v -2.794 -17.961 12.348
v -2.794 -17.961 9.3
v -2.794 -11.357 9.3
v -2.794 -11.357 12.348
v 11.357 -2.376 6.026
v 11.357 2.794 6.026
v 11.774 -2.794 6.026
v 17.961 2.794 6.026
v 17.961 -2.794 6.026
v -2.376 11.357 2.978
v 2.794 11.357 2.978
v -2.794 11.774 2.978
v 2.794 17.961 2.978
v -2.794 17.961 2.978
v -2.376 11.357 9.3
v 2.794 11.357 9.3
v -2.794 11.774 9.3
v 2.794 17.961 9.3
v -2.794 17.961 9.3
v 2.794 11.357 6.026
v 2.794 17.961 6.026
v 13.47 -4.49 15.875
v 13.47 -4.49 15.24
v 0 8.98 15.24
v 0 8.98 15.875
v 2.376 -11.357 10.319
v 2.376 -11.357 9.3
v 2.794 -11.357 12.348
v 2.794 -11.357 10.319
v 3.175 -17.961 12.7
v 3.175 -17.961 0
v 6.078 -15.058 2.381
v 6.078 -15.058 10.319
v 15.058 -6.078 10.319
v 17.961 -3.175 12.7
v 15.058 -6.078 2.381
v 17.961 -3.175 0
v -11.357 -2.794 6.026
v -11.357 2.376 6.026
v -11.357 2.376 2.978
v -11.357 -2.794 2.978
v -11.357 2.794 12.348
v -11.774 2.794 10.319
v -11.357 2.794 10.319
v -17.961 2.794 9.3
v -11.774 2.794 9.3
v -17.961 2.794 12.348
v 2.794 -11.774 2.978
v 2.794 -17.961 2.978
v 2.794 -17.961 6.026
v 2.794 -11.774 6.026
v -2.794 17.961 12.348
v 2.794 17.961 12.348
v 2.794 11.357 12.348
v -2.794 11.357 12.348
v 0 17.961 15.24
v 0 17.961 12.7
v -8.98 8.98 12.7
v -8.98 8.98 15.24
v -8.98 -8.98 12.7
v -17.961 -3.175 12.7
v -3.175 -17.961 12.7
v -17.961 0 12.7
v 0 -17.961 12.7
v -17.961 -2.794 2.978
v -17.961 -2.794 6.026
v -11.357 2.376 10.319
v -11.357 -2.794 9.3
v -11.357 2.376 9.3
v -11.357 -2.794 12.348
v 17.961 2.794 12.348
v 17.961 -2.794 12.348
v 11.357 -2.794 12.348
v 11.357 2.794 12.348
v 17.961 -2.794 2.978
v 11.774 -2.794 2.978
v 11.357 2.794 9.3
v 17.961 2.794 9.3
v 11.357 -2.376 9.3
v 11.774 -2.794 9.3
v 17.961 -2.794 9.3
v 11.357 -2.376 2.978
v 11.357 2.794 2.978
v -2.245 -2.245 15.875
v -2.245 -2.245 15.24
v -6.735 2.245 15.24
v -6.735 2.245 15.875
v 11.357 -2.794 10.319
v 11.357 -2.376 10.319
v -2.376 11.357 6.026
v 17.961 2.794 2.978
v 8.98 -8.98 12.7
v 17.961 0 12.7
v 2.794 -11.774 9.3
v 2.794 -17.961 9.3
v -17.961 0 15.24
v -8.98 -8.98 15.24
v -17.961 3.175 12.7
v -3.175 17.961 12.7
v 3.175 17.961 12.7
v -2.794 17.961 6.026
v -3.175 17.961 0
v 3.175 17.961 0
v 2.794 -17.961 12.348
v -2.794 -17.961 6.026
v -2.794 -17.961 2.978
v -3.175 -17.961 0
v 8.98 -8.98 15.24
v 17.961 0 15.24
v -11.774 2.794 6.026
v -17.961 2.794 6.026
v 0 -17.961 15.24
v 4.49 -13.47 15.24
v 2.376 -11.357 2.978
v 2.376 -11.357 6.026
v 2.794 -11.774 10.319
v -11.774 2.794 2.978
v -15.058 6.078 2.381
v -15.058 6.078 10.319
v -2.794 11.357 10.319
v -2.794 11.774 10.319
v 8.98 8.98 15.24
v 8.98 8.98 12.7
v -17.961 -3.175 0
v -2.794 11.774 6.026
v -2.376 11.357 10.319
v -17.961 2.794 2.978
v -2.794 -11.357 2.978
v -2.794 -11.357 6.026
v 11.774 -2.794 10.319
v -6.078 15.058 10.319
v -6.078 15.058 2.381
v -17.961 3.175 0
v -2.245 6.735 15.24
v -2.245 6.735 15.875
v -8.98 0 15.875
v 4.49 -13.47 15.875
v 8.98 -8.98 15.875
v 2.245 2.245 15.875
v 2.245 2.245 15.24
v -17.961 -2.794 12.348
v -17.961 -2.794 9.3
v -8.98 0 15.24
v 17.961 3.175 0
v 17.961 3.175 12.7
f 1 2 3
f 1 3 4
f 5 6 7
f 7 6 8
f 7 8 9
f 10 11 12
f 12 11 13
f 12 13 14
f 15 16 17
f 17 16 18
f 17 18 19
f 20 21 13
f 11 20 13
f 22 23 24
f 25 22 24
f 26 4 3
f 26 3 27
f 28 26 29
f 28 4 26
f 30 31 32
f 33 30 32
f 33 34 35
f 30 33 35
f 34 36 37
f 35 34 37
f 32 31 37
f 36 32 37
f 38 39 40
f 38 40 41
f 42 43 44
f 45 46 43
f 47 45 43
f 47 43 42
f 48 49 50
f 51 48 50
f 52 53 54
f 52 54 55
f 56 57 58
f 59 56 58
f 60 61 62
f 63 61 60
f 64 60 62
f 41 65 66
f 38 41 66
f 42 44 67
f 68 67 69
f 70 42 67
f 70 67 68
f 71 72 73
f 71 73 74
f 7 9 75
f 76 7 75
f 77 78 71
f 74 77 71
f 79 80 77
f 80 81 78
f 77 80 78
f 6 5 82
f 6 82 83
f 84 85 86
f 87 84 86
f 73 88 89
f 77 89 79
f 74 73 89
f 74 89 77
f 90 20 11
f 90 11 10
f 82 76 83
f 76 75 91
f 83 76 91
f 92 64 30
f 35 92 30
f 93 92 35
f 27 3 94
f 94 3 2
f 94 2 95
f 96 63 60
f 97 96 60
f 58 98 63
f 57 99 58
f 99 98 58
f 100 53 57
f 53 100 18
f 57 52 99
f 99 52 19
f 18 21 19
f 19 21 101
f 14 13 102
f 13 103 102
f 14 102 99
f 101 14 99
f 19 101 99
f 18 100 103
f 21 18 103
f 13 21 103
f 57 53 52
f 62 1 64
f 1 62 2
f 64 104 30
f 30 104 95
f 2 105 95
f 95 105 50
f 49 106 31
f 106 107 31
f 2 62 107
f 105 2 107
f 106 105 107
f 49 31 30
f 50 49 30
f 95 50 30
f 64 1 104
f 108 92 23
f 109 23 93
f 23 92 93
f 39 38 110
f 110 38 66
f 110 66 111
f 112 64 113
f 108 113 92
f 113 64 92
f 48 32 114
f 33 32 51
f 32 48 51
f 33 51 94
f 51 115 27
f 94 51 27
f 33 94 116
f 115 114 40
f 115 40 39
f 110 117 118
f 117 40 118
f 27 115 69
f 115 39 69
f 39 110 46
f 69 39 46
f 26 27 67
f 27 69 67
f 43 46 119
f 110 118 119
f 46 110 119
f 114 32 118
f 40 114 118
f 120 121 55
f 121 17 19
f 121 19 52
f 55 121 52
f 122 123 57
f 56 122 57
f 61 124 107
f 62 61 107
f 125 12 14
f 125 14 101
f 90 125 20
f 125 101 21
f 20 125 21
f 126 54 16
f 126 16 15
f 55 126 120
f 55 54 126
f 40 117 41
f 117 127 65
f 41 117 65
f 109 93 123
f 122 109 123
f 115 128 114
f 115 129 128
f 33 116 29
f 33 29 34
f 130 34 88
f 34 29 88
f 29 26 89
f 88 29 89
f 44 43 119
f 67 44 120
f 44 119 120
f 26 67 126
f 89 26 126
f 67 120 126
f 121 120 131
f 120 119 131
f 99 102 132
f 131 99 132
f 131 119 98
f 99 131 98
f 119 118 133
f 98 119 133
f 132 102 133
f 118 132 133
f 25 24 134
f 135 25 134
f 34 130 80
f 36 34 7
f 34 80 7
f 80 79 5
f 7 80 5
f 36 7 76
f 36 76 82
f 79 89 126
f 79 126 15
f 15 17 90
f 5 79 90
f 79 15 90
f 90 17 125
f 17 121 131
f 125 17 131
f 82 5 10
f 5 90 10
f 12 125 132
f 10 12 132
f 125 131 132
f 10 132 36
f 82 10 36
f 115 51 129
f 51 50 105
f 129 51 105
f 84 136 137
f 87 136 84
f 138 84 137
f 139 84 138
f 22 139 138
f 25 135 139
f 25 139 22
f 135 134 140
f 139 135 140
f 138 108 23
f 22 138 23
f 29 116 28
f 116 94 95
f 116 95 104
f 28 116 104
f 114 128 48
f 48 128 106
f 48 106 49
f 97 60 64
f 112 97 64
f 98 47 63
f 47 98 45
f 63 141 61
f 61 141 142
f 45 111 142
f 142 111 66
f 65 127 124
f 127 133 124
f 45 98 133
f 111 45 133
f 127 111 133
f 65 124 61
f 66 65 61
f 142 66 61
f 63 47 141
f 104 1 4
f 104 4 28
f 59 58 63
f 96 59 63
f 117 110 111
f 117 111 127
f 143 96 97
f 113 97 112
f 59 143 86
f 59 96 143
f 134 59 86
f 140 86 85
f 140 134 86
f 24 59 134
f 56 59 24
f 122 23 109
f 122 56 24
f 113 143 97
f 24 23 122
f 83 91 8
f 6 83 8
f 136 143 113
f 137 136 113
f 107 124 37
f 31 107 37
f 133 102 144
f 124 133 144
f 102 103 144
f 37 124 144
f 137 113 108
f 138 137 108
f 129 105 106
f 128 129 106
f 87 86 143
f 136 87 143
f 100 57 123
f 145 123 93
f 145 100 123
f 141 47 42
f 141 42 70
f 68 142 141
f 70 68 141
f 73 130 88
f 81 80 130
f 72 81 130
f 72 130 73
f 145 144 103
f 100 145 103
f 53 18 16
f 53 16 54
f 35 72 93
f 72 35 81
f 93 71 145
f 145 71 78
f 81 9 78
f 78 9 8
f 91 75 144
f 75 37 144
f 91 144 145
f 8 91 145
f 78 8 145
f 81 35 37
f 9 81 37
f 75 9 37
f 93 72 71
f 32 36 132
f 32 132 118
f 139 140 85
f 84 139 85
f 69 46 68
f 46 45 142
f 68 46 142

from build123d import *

# Parameters (mm, degrees)
F1_DEPTH  = 15.24
F2_DEPTH  = 12.7
F4_W      = 5.588
F4_H      = 3.048
F4_W_2    = 5.08
F4_H_2    = 2.481671654
F4_W_3    = 2.54
F4_H_3    = 2.6544967359
F5_DEPTH  = 6.604
F6_W      = 5.588
F6_H      = 3.048
F6_W_2    = 5.08
F6_H_2    = 2.481671654
F6_W_3    = 2.54
F6_H_3    = 2.6544967359
F7_DEPTH  = 6.604
F8_W      = 5.588
F8_H      = 3.048
F8_W_2    = 5.08
F8_H_2    = 2.481671654
F8_W_3    = 2.54
F8_H_3    = 2.6544967359
F9_DEPTH  = 6.604
F10_DEPTH = 3.175
F11_W     = 5.588
F11_H     = 3.048
F11_W_2   = 5.08
F11_H_2   = 2.481671654
F11_W_3   = 2.54
F11_H_3   = 2.6544967359
F12_DEPTH = 6.604
F14_DEPTH = 38.1


with BuildPart() as f1:
    # F0 (on Top) → F1 (new body)
    with BuildSketch(Plane.XY):
        Polygon((8.9802561211, 8.9802561211), (0, 17.9605122421), (-8.9802561211, 8.9802561211), (0, 0), align=None)
        Polygon((17.9605122421, 0), (8.9802561211, 8.9802561211), (0, 0), (8.9802561211, -8.9802561211), align=None)
        Polygon((0, 0), (-8.9802561211, -8.9802561211), (0, -17.9605122421), (8.9802561211, -8.9802561211), align=None)
        Polygon((-8.9802561211, 8.9802561211), (-17.9605122421, 0), (-8.9802561211, -8.9802561211), (0, 0), align=None)
    extrude(amount=F1_DEPTH)

    # F0 (on Top) → F2 (join)
    with BuildSketch(Plane.XY):
        Polygon((0, 17.9605122421), (-3.175, 17.9605122421), (-17.9605122421, 3.175), (-17.9605122421, 0), (-8.9802561211, 8.9802561211), align=None)
        Polygon((-8.9802561211, -8.9802561211), (-17.9605122421, 0), (-17.9605122421, -3.175), (-3.175, -17.9605122421), (0, -17.9605122421), align=None)
        Polygon((17.9605122421, -3.175), (17.9605122421, 0), (8.9802561211, -8.9802561211), (0, -17.9605122421), (3.175, -17.9605122421), align=None)
        Polygon((3.175, 17.9605122421), (0, 17.9605122421), (8.9802561211, 8.9802561211), (17.9605122421, 0), (17.9605122421, 3.175), align=None)
    extrude(amount=F2_DEPTH)

    # F4 (on face) → F5 (cut)
    with BuildSketch(Plane(origin=(-17.9605122421, 0, 0), x_dir=(0, -1, 0), z_dir=(-1, 0, 0))):
        with Locations((0, 10.824164173)):
            Rectangle(F4_W, F4_H)
        with Locations((0, 10.824164173)):
            Rectangle(F4_W_2, F4_H_2, mode=Mode.SUBTRACT)
        with Locations((0, 10.824164173)):
            Rectangle(F4_W_2, F4_H_2)
        with Locations((-1.27, 4.5022483679)):
            Rectangle(F4_W_3, F4_H_3)
        with Locations((1.27, 4.5022483679)):
            Rectangle(F4_W_3, F4_H_3)
        Polygon((0, 3.175), (-2.54, 3.175), (-2.54, 5.8294967359), (0, 5.8294967359), (0, 6.0262483679), (-2.794, 6.0262483679), (-2.794, 2.9782483679), (0, 2.9782483679), align=None)
        Polygon((2.54, 3.175), (0, 3.175), (0, 2.9782483679), (2.794, 2.9782483679), (2.794, 6.0262483679), (0, 6.0262483679), (0, 5.8294967359), (2.54, 5.8294967359), align=None)
    extrude(amount=-F5_DEPTH, mode=Mode.SUBTRACT)

    # F6 (on face) → F7 (cut)
    with BuildSketch(Plane.YZ.offset(17.9605122421)):
        with Locations((0, 10.824164173)):
            Rectangle(F6_W, F6_H)
        with Locations((0, 10.824164173)):
            Rectangle(F6_W_2, F6_H_2, mode=Mode.SUBTRACT)
        with Locations((0, 10.824164173)):
            Rectangle(F6_W_2, F6_H_2)
        with Locations((1.27, 4.5022483679)):
            Rectangle(F6_W_3, F6_H_3)
        with Locations((-1.27, 4.5022483679)):
            Rectangle(F6_W_3, F6_H_3)
        Polygon((0, 3.175), (-2.54, 3.175), (-2.54, 5.8294967359), (0, 5.8294967359), (0, 6.0262483679), (-2.794, 6.0262483679), (-2.794, 2.9782483679), (0, 2.9782483679), align=None)
        Polygon((2.54, 3.175), (0, 3.175), (0, 2.9782483679), (2.794, 2.9782483679), (2.794, 6.0262483679), (0, 6.0262483679), (0, 5.8294967359), (2.54, 5.8294967359), align=None)
    extrude(amount=-F7_DEPTH, mode=Mode.SUBTRACT)

    # F8 (on face) → F9 (cut)
    with BuildSketch(Plane.XZ.offset(17.9605122421)):
        with Locations((0, 10.824164173)):
            Rectangle(F8_W, F8_H)
        with Locations((0, 10.824164173)):
            Rectangle(F8_W_2, F8_H_2, mode=Mode.SUBTRACT)
        Polygon((2.54, 3.175), (0, 3.175), (0, 2.9782483679), (2.794, 2.9782483679), (2.794, 6.0262483679), (0, 6.0262483679), (0, 5.8294967359), (2.54, 5.8294967359), align=None)
        Polygon((0, 3.175), (-2.54, 3.175), (-2.54, 5.8294967359), (0, 5.8294967359), (0, 6.0262483679), (-2.794, 6.0262483679), (-2.794, 2.9782483679), (0, 2.9782483679), align=None)
        with Locations((-1.27, 4.5022483679)):
            Rectangle(F8_W_3, F8_H_3)
        with Locations((0, 10.824164173)):
            Rectangle(F8_W_2, F8_H_2)
        with Locations((1.27, 4.5022483679)):
            Rectangle(F8_W_3, F8_H_3)
    extrude(amount=-F9_DEPTH, mode=Mode.SUBTRACT)

    # F3 (on face) → F10 (join)
    with BuildSketch(Plane.XY.offset(12.7)):
        Polygon((0, 0), (8.9802561211, -8.9802561211), (13.4703841816, -4.4901280605), (0, 8.9802561211), (-2.2450640303, 6.7351920908), (2.2450640303, 2.2450640303), align=None)
        Polygon((4.4901280605, -13.4703841816), (8.9802561211, -8.9802561211), (0, 0), (-2.2450640303, -2.2450640303), (-6.7351920908, 2.2450640303), (-8.9802561211, 0), align=None)
    extrude(amount=F10_DEPTH)

    # F11 (on face) → F12 (cut)
    with BuildSketch(Plane(origin=(0, 17.9605122421, 0), x_dir=(-1, 0, 0), z_dir=(0, 1, 0))):
        Polygon((0, 3.175), (-2.54, 3.175), (-2.54, 5.8294967359), (0, 5.8294967359), (0, 6.0262483679), (-2.794, 6.0262483679), (-2.794, 2.9782483679), (0, 2.9782483679), align=None)
        Polygon((2.54, 3.175), (0, 3.175), (0, 2.9782483679), (2.794, 2.9782483679), (2.794, 6.0262483679), (0, 6.0262483679), (0, 5.8294967359), (2.54, 5.8294967359), align=None)
        with Locations((0, 10.824164173)):
            Rectangle(F11_W, F11_H)
        with Locations((0, 10.824164173)):
            Rectangle(F11_W_2, F11_H_2, mode=Mode.SUBTRACT)
        with Locations((-1.27, 4.5022483679)):
            Rectangle(F11_W_3, F11_H_3)
        with Locations((1.27, 4.5022483679)):
            Rectangle(F11_W_3, F11_H_3)
        with Locations((0, 10.824164173)):
            Rectangle(F11_W_2, F11_H_2)
    extrude(amount=-F12_DEPTH, mode=Mode.SUBTRACT)

    # F13 (on face) → F14 (cut)
    with BuildSketch(Plane(origin=(-10.5677561211, 10.5677561211, 0), x_dir=(-0.7071067812, -0.7071067812, 0), z_dir=(-0.7071067812, 0.7071067812, 0))):
        Polygon((-6.35, 2.38125), (0, 2.38125), (6.35, 2.38125), (6.35, 10.31875), (-6.35, 10.31875), align=None)
    extrude(amount=-F14_DEPTH, mode=Mode.SUBTRACT)


solid = f1.part
